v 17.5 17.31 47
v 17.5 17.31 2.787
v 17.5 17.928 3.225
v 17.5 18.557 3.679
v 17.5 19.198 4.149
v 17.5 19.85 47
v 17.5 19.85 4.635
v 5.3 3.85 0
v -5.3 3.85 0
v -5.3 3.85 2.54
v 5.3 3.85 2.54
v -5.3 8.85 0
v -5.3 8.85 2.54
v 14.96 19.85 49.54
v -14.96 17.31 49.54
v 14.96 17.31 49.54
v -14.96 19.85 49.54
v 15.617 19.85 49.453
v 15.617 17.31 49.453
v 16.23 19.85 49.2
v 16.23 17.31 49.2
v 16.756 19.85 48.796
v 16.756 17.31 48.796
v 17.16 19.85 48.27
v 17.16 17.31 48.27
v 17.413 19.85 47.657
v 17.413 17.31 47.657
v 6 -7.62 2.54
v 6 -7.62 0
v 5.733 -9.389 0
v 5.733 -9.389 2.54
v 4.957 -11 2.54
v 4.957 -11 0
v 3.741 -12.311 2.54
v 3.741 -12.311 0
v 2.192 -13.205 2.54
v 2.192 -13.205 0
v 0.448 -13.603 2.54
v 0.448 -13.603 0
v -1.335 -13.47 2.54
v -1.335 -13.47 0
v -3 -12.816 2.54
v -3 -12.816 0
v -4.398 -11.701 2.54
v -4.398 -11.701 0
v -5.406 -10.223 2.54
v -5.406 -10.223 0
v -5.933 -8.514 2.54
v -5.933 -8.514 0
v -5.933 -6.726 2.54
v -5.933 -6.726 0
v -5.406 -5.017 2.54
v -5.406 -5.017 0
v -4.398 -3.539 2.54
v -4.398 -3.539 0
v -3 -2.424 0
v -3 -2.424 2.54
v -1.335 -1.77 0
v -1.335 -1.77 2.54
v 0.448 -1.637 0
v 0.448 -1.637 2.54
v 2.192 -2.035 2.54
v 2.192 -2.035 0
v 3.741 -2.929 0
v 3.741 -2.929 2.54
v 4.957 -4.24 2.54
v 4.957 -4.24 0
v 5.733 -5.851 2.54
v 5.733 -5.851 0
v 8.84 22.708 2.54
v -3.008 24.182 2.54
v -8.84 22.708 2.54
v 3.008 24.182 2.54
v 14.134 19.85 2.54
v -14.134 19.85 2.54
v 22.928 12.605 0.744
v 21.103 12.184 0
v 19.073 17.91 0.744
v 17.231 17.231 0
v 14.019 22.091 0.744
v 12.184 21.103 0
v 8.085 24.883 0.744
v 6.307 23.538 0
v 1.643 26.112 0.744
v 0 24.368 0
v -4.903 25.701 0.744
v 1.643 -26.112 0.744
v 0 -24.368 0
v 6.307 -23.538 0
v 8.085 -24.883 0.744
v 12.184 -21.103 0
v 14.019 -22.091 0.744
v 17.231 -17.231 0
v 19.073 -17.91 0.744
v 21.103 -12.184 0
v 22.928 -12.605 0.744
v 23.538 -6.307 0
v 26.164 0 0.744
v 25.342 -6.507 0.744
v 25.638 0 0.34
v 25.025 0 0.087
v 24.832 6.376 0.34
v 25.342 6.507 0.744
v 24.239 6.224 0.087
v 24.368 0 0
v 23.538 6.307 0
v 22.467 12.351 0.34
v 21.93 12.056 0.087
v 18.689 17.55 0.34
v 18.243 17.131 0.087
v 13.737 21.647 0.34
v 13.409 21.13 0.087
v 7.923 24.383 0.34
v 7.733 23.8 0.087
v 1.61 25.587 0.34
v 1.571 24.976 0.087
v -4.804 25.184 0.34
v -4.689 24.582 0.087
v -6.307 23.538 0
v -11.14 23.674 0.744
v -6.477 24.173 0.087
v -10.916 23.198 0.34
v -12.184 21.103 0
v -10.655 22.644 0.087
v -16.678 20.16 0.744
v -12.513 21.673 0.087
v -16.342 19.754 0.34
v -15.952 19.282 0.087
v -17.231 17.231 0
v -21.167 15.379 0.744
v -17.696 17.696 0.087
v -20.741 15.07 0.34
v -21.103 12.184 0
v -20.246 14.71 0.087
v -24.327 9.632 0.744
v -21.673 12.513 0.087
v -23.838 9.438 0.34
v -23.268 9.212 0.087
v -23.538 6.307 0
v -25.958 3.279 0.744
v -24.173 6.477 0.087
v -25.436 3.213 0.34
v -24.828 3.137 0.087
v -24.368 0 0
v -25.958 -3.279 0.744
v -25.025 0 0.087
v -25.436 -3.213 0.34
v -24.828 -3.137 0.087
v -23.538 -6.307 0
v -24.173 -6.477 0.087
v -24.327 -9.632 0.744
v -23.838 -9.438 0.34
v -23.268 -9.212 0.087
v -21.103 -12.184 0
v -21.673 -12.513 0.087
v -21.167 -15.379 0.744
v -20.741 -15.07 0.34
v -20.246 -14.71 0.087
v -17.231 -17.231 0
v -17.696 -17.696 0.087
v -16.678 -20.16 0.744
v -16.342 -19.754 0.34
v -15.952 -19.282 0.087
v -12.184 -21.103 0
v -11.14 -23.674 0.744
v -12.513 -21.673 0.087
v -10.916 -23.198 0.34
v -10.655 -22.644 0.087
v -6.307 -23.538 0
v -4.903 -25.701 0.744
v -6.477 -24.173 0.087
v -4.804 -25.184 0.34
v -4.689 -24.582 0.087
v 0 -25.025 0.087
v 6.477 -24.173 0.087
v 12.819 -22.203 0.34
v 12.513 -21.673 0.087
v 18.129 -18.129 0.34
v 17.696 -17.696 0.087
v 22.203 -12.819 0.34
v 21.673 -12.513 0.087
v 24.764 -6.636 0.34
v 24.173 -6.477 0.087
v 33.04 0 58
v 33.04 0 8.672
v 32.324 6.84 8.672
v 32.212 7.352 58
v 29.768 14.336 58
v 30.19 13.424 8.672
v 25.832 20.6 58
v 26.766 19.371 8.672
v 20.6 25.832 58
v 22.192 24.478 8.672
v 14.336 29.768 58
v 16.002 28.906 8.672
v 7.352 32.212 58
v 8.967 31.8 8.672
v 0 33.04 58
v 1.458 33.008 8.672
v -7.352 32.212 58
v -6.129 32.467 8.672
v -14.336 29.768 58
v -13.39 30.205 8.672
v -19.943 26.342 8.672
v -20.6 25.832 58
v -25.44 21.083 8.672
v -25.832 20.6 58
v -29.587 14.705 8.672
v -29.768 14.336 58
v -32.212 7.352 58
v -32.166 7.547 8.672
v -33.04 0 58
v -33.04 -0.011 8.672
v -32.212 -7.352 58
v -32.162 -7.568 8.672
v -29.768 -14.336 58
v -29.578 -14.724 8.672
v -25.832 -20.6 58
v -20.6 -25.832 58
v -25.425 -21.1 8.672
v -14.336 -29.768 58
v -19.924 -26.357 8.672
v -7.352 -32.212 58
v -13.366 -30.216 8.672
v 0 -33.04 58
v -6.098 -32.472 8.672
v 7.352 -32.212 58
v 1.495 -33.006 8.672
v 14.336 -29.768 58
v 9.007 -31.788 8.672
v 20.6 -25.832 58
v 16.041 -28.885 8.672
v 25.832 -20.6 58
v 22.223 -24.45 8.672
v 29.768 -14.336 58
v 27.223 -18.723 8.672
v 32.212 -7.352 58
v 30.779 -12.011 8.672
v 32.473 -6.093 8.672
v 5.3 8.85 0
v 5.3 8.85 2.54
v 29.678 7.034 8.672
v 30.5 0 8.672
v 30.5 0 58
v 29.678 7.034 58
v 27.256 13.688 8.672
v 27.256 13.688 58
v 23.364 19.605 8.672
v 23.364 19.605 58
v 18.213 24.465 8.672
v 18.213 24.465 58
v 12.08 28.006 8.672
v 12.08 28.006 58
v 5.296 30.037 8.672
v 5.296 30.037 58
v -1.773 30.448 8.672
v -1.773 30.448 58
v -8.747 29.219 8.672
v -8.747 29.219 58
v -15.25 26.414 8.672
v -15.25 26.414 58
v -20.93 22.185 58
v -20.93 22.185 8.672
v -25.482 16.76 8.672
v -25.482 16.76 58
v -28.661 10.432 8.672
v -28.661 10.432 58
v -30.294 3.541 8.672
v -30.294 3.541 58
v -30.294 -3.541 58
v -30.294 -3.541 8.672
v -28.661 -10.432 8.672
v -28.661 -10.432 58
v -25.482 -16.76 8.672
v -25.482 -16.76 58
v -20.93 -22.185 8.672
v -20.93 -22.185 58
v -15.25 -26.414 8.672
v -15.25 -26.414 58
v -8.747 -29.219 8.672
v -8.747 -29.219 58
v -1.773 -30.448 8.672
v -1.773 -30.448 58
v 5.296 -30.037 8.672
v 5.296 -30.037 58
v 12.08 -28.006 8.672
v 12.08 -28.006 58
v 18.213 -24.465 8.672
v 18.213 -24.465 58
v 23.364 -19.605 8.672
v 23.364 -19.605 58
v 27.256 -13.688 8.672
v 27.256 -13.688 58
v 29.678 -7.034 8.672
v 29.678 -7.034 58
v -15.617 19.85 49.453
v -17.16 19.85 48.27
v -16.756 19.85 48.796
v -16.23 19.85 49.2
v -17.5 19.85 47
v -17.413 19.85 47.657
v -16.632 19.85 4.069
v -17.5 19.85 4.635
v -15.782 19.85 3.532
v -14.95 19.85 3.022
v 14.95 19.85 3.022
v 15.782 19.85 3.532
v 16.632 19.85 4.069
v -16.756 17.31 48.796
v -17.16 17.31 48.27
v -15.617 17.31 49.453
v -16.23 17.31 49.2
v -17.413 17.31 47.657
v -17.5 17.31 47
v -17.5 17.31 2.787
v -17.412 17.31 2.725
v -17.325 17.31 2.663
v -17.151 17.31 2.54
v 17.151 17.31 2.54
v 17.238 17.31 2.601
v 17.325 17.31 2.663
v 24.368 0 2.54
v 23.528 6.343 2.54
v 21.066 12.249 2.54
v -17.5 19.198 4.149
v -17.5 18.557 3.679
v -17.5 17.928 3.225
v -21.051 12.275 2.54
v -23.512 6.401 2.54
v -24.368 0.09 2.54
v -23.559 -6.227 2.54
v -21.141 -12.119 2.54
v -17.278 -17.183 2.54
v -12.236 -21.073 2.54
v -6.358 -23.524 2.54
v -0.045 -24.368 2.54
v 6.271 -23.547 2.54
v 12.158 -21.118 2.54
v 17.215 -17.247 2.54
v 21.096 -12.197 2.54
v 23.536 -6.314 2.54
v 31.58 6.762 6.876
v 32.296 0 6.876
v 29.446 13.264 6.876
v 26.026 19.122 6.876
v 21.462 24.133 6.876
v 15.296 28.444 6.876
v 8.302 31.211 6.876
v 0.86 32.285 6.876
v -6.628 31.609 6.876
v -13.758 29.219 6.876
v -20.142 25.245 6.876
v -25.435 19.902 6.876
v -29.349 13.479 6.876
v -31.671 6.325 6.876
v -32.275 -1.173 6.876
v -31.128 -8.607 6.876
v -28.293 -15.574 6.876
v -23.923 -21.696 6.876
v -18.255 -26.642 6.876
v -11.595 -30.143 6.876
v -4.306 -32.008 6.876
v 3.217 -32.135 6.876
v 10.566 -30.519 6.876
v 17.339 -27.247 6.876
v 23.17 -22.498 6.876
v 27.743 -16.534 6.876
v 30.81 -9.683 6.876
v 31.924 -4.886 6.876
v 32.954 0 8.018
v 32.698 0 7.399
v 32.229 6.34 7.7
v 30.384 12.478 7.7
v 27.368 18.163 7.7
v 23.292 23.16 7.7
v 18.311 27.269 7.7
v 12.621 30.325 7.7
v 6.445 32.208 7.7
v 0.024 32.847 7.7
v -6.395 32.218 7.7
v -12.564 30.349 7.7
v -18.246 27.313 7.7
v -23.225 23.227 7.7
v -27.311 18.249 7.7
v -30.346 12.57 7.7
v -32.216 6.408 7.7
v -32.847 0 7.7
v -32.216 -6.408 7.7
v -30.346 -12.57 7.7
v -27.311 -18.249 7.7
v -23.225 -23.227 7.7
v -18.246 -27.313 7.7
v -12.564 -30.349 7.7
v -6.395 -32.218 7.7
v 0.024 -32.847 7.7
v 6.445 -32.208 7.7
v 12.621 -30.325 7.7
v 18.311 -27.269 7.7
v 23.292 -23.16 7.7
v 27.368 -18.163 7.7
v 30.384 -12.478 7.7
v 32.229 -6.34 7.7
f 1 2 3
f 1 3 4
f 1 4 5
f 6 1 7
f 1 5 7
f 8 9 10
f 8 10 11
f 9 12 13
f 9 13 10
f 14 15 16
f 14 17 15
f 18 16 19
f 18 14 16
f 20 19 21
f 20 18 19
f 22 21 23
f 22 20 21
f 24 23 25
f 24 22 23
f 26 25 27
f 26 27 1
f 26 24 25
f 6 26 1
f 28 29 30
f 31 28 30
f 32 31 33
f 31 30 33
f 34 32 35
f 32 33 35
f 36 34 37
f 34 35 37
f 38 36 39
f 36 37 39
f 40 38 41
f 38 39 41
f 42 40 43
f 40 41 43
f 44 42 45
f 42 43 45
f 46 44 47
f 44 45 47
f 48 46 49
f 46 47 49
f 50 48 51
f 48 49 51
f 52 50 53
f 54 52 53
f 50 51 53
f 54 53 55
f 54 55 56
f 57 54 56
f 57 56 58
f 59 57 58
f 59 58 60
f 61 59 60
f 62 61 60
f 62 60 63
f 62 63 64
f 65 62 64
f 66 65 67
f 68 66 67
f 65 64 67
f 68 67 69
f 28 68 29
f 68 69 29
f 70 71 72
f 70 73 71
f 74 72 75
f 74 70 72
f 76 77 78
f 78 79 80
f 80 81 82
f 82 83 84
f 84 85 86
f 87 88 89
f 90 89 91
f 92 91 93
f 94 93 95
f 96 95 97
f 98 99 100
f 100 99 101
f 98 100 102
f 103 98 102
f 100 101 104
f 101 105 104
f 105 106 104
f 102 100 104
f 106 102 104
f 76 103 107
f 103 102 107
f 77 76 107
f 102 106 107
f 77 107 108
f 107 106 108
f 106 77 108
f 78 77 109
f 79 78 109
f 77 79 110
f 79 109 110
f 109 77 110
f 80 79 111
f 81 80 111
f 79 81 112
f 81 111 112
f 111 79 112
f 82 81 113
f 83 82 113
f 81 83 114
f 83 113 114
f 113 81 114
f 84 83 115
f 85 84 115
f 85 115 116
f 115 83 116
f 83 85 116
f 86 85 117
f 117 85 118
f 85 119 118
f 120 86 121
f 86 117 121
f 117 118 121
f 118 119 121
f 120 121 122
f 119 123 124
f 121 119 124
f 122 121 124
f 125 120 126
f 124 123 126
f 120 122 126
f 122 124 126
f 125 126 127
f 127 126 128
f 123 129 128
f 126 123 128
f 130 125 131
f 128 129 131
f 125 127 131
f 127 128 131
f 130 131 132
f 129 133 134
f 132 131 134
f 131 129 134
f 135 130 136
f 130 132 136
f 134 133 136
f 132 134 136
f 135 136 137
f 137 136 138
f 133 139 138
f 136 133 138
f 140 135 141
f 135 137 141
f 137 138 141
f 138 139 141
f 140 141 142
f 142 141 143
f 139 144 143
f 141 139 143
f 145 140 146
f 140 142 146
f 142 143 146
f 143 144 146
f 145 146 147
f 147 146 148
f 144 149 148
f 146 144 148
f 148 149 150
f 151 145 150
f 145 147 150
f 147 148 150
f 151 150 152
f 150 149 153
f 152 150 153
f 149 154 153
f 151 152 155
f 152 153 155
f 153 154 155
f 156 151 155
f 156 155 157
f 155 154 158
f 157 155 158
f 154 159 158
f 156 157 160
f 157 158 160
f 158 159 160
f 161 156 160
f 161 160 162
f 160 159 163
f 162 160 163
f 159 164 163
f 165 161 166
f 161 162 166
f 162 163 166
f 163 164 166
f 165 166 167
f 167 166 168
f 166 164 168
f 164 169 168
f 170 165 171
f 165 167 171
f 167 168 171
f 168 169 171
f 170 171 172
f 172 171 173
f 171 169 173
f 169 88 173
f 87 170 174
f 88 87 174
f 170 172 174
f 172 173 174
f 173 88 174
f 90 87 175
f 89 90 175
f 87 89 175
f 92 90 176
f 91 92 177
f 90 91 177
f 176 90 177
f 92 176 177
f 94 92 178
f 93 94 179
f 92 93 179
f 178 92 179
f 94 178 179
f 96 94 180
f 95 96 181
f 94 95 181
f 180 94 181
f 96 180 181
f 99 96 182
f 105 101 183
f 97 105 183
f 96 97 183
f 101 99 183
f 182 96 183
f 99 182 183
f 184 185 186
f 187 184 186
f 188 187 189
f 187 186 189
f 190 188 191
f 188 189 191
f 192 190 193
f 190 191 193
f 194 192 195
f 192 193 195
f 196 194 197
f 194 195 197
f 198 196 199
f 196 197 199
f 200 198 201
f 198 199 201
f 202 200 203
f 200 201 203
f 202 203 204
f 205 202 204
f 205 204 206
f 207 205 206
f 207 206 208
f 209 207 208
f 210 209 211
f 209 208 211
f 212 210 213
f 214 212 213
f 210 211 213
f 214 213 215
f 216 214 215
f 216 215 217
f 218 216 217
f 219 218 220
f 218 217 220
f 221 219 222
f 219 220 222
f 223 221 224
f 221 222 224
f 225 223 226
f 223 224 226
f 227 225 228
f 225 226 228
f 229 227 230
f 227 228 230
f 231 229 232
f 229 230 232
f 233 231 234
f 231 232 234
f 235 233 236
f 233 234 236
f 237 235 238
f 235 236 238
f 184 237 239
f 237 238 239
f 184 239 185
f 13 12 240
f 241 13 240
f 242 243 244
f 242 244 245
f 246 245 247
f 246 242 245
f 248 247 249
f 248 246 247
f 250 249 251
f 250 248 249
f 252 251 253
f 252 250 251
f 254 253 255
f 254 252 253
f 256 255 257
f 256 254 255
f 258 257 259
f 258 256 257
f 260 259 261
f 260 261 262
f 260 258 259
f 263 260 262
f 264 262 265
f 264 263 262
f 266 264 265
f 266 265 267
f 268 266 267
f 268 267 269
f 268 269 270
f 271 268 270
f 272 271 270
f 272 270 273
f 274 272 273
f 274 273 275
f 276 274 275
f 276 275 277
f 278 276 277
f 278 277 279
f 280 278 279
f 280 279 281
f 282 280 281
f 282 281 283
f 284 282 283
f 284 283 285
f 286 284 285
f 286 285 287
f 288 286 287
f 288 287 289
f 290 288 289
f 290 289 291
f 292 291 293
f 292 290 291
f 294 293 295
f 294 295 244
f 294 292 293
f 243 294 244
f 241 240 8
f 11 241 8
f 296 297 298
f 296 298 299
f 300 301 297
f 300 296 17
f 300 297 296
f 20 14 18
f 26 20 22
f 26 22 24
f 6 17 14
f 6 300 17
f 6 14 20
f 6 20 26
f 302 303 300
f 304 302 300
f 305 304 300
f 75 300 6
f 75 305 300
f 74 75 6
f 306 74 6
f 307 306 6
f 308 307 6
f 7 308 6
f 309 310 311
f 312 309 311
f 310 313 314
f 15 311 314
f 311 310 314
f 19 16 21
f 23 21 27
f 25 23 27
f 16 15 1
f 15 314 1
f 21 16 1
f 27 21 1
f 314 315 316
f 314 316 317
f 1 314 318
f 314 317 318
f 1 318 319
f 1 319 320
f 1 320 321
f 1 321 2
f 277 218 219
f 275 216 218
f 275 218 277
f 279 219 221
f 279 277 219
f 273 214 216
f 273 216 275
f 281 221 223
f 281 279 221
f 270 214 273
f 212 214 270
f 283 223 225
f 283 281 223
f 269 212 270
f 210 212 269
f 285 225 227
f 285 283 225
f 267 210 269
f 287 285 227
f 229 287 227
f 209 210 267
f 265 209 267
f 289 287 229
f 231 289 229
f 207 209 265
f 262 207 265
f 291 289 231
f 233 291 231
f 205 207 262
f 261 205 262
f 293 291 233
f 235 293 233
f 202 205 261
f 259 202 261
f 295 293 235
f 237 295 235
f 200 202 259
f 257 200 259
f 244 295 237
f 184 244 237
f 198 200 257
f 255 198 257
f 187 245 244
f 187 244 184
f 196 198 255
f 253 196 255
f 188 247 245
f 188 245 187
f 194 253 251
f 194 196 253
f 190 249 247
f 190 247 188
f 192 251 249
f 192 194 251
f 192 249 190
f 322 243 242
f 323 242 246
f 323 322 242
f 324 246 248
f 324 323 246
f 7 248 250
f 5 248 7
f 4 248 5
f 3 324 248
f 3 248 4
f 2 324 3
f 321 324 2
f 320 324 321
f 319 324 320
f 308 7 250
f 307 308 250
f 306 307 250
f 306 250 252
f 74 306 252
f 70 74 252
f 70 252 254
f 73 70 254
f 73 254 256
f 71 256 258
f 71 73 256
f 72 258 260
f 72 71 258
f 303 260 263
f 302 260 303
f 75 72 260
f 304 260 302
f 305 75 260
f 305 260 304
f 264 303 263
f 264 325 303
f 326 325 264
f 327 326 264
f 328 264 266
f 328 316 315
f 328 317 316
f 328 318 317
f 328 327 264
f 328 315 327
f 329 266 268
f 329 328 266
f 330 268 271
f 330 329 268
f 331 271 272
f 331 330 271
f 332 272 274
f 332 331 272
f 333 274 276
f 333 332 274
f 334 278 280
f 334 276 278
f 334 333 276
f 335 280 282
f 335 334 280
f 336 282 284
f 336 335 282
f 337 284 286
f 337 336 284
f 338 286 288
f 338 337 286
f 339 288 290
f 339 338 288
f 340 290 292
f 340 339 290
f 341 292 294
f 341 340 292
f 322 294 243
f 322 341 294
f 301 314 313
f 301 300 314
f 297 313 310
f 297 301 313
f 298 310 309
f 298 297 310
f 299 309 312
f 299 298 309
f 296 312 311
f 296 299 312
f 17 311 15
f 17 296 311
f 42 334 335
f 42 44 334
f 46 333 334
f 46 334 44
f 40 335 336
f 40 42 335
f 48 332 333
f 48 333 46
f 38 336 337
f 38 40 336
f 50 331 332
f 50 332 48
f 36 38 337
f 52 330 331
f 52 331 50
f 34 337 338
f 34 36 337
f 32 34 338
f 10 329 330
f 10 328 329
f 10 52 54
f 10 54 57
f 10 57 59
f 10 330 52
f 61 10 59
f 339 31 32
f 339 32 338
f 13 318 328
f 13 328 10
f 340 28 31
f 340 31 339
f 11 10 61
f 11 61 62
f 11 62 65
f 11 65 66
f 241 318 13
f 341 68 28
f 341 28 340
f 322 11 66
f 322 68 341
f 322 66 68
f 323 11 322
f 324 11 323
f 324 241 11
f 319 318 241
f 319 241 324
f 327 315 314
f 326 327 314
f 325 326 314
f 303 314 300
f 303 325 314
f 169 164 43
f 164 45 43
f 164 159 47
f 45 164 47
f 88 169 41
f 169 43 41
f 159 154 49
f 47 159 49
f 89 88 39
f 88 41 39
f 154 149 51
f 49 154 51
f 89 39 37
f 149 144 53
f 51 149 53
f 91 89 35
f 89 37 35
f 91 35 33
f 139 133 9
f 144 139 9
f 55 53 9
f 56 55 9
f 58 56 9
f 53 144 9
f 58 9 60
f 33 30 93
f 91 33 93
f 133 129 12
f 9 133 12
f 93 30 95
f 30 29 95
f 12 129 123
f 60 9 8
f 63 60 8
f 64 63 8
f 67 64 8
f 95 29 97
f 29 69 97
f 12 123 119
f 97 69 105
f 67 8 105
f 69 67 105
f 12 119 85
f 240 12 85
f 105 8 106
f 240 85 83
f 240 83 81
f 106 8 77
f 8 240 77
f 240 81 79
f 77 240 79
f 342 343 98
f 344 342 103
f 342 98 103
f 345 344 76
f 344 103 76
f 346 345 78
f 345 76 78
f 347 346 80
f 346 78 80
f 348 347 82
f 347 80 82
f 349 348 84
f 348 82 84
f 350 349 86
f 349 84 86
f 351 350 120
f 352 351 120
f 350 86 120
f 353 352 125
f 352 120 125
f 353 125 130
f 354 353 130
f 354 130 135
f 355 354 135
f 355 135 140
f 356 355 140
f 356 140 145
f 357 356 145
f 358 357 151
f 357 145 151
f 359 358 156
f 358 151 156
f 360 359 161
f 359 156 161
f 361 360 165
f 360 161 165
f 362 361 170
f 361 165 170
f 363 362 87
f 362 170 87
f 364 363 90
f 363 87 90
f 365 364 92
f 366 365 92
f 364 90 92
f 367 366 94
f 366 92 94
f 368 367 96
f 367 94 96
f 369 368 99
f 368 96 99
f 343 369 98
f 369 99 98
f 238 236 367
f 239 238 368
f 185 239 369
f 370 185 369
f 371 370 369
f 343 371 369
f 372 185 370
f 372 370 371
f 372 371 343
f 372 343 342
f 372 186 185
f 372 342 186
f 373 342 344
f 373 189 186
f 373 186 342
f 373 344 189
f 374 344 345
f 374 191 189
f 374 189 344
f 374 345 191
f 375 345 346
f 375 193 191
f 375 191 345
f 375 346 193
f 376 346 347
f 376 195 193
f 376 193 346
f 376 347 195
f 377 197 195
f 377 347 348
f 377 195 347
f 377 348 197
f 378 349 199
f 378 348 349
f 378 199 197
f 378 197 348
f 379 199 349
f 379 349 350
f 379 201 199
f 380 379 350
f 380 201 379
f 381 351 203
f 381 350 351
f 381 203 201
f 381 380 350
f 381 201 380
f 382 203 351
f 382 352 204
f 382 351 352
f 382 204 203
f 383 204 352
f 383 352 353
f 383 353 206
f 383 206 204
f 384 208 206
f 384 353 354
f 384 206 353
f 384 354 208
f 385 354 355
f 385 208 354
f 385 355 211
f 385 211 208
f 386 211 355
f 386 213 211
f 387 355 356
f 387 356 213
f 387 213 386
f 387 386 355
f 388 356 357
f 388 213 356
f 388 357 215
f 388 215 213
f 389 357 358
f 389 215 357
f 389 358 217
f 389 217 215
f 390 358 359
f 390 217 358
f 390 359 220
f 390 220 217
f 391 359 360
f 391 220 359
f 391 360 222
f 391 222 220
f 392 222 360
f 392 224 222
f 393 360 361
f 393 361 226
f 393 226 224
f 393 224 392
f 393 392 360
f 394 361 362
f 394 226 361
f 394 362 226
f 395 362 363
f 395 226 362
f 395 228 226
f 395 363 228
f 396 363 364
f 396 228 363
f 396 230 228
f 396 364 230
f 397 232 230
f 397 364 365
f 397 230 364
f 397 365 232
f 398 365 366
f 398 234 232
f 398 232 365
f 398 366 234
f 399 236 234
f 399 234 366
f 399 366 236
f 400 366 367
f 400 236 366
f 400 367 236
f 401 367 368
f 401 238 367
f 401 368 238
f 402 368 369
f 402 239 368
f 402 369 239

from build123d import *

# Parameters (mm, degrees)
F0_R     = 33.04
F1_DEPTH = 58
F2_SIZE  = 7.62
F3_T     = -2.54
F4_R     = 2.54
F5_R     = 6
F5_W     = 10.6
F5_H     = 5
F6_DEPTH = 2.54
F7_W     = 35
F7_H     = 2.54
F8_DEPTH = 47
F9_R     = 2.54


with BuildPart() as f1:
    # F0 (on Top) → F1 (new body)
    with BuildSketch(Plane.XY):
        Circle(F0_R)
    extrude(amount=F1_DEPTH)

    # F2
    f2_edges = [f1.edges().sort_by_distance(p)[0] for p in [
        (-33.04, 0, 0),
    ]]
    chamfer(f2_edges, length=F2_SIZE)

    # F3
    f3_openings = [f1.faces().sort_by_distance(p)[0] for p in [
        (0, 0, 58),
    ]]
    offset(amount=F3_T, openings=f3_openings)

    # F4
    f4_edges = [f1.edges().sort_by_distance(p)[0] for p in [
        (-33.04, 0, 7.62),
        (-25.42, 0, 0),
    ]]
    fillet(f4_edges, radius=F4_R)

    # F5 (on face) → F6 (cut, through all)
    with BuildSketch(Plane(origin=(0, 0, 0), x_dir=(1, 0, 0), z_dir=(0, 0, -1))):
        with Locations((0, 7.62)):
            Circle(F5_R)
        with Locations((0, -6.35)):
            Rectangle(F5_W, F5_H)
    extrude(amount=-F6_DEPTH, mode=Mode.SUBTRACT)

    # F7 (on face) → F8 (join)
    with BuildSketch(Plane.XY.offset(2.54)):
        with Locations((0, 18.58)):
            Rectangle(F7_W, F7_H)
    extrude(amount=F8_DEPTH)

    # F9
    f9_edges = [f1.edges().sort_by_distance(p)[0] for p in [
        (-17.5, 18.58, 49.54),
        (17.5, 18.58, 49.54),
    ]]
    fillet(f9_edges, radius=F9_R)


solid = f1.part
